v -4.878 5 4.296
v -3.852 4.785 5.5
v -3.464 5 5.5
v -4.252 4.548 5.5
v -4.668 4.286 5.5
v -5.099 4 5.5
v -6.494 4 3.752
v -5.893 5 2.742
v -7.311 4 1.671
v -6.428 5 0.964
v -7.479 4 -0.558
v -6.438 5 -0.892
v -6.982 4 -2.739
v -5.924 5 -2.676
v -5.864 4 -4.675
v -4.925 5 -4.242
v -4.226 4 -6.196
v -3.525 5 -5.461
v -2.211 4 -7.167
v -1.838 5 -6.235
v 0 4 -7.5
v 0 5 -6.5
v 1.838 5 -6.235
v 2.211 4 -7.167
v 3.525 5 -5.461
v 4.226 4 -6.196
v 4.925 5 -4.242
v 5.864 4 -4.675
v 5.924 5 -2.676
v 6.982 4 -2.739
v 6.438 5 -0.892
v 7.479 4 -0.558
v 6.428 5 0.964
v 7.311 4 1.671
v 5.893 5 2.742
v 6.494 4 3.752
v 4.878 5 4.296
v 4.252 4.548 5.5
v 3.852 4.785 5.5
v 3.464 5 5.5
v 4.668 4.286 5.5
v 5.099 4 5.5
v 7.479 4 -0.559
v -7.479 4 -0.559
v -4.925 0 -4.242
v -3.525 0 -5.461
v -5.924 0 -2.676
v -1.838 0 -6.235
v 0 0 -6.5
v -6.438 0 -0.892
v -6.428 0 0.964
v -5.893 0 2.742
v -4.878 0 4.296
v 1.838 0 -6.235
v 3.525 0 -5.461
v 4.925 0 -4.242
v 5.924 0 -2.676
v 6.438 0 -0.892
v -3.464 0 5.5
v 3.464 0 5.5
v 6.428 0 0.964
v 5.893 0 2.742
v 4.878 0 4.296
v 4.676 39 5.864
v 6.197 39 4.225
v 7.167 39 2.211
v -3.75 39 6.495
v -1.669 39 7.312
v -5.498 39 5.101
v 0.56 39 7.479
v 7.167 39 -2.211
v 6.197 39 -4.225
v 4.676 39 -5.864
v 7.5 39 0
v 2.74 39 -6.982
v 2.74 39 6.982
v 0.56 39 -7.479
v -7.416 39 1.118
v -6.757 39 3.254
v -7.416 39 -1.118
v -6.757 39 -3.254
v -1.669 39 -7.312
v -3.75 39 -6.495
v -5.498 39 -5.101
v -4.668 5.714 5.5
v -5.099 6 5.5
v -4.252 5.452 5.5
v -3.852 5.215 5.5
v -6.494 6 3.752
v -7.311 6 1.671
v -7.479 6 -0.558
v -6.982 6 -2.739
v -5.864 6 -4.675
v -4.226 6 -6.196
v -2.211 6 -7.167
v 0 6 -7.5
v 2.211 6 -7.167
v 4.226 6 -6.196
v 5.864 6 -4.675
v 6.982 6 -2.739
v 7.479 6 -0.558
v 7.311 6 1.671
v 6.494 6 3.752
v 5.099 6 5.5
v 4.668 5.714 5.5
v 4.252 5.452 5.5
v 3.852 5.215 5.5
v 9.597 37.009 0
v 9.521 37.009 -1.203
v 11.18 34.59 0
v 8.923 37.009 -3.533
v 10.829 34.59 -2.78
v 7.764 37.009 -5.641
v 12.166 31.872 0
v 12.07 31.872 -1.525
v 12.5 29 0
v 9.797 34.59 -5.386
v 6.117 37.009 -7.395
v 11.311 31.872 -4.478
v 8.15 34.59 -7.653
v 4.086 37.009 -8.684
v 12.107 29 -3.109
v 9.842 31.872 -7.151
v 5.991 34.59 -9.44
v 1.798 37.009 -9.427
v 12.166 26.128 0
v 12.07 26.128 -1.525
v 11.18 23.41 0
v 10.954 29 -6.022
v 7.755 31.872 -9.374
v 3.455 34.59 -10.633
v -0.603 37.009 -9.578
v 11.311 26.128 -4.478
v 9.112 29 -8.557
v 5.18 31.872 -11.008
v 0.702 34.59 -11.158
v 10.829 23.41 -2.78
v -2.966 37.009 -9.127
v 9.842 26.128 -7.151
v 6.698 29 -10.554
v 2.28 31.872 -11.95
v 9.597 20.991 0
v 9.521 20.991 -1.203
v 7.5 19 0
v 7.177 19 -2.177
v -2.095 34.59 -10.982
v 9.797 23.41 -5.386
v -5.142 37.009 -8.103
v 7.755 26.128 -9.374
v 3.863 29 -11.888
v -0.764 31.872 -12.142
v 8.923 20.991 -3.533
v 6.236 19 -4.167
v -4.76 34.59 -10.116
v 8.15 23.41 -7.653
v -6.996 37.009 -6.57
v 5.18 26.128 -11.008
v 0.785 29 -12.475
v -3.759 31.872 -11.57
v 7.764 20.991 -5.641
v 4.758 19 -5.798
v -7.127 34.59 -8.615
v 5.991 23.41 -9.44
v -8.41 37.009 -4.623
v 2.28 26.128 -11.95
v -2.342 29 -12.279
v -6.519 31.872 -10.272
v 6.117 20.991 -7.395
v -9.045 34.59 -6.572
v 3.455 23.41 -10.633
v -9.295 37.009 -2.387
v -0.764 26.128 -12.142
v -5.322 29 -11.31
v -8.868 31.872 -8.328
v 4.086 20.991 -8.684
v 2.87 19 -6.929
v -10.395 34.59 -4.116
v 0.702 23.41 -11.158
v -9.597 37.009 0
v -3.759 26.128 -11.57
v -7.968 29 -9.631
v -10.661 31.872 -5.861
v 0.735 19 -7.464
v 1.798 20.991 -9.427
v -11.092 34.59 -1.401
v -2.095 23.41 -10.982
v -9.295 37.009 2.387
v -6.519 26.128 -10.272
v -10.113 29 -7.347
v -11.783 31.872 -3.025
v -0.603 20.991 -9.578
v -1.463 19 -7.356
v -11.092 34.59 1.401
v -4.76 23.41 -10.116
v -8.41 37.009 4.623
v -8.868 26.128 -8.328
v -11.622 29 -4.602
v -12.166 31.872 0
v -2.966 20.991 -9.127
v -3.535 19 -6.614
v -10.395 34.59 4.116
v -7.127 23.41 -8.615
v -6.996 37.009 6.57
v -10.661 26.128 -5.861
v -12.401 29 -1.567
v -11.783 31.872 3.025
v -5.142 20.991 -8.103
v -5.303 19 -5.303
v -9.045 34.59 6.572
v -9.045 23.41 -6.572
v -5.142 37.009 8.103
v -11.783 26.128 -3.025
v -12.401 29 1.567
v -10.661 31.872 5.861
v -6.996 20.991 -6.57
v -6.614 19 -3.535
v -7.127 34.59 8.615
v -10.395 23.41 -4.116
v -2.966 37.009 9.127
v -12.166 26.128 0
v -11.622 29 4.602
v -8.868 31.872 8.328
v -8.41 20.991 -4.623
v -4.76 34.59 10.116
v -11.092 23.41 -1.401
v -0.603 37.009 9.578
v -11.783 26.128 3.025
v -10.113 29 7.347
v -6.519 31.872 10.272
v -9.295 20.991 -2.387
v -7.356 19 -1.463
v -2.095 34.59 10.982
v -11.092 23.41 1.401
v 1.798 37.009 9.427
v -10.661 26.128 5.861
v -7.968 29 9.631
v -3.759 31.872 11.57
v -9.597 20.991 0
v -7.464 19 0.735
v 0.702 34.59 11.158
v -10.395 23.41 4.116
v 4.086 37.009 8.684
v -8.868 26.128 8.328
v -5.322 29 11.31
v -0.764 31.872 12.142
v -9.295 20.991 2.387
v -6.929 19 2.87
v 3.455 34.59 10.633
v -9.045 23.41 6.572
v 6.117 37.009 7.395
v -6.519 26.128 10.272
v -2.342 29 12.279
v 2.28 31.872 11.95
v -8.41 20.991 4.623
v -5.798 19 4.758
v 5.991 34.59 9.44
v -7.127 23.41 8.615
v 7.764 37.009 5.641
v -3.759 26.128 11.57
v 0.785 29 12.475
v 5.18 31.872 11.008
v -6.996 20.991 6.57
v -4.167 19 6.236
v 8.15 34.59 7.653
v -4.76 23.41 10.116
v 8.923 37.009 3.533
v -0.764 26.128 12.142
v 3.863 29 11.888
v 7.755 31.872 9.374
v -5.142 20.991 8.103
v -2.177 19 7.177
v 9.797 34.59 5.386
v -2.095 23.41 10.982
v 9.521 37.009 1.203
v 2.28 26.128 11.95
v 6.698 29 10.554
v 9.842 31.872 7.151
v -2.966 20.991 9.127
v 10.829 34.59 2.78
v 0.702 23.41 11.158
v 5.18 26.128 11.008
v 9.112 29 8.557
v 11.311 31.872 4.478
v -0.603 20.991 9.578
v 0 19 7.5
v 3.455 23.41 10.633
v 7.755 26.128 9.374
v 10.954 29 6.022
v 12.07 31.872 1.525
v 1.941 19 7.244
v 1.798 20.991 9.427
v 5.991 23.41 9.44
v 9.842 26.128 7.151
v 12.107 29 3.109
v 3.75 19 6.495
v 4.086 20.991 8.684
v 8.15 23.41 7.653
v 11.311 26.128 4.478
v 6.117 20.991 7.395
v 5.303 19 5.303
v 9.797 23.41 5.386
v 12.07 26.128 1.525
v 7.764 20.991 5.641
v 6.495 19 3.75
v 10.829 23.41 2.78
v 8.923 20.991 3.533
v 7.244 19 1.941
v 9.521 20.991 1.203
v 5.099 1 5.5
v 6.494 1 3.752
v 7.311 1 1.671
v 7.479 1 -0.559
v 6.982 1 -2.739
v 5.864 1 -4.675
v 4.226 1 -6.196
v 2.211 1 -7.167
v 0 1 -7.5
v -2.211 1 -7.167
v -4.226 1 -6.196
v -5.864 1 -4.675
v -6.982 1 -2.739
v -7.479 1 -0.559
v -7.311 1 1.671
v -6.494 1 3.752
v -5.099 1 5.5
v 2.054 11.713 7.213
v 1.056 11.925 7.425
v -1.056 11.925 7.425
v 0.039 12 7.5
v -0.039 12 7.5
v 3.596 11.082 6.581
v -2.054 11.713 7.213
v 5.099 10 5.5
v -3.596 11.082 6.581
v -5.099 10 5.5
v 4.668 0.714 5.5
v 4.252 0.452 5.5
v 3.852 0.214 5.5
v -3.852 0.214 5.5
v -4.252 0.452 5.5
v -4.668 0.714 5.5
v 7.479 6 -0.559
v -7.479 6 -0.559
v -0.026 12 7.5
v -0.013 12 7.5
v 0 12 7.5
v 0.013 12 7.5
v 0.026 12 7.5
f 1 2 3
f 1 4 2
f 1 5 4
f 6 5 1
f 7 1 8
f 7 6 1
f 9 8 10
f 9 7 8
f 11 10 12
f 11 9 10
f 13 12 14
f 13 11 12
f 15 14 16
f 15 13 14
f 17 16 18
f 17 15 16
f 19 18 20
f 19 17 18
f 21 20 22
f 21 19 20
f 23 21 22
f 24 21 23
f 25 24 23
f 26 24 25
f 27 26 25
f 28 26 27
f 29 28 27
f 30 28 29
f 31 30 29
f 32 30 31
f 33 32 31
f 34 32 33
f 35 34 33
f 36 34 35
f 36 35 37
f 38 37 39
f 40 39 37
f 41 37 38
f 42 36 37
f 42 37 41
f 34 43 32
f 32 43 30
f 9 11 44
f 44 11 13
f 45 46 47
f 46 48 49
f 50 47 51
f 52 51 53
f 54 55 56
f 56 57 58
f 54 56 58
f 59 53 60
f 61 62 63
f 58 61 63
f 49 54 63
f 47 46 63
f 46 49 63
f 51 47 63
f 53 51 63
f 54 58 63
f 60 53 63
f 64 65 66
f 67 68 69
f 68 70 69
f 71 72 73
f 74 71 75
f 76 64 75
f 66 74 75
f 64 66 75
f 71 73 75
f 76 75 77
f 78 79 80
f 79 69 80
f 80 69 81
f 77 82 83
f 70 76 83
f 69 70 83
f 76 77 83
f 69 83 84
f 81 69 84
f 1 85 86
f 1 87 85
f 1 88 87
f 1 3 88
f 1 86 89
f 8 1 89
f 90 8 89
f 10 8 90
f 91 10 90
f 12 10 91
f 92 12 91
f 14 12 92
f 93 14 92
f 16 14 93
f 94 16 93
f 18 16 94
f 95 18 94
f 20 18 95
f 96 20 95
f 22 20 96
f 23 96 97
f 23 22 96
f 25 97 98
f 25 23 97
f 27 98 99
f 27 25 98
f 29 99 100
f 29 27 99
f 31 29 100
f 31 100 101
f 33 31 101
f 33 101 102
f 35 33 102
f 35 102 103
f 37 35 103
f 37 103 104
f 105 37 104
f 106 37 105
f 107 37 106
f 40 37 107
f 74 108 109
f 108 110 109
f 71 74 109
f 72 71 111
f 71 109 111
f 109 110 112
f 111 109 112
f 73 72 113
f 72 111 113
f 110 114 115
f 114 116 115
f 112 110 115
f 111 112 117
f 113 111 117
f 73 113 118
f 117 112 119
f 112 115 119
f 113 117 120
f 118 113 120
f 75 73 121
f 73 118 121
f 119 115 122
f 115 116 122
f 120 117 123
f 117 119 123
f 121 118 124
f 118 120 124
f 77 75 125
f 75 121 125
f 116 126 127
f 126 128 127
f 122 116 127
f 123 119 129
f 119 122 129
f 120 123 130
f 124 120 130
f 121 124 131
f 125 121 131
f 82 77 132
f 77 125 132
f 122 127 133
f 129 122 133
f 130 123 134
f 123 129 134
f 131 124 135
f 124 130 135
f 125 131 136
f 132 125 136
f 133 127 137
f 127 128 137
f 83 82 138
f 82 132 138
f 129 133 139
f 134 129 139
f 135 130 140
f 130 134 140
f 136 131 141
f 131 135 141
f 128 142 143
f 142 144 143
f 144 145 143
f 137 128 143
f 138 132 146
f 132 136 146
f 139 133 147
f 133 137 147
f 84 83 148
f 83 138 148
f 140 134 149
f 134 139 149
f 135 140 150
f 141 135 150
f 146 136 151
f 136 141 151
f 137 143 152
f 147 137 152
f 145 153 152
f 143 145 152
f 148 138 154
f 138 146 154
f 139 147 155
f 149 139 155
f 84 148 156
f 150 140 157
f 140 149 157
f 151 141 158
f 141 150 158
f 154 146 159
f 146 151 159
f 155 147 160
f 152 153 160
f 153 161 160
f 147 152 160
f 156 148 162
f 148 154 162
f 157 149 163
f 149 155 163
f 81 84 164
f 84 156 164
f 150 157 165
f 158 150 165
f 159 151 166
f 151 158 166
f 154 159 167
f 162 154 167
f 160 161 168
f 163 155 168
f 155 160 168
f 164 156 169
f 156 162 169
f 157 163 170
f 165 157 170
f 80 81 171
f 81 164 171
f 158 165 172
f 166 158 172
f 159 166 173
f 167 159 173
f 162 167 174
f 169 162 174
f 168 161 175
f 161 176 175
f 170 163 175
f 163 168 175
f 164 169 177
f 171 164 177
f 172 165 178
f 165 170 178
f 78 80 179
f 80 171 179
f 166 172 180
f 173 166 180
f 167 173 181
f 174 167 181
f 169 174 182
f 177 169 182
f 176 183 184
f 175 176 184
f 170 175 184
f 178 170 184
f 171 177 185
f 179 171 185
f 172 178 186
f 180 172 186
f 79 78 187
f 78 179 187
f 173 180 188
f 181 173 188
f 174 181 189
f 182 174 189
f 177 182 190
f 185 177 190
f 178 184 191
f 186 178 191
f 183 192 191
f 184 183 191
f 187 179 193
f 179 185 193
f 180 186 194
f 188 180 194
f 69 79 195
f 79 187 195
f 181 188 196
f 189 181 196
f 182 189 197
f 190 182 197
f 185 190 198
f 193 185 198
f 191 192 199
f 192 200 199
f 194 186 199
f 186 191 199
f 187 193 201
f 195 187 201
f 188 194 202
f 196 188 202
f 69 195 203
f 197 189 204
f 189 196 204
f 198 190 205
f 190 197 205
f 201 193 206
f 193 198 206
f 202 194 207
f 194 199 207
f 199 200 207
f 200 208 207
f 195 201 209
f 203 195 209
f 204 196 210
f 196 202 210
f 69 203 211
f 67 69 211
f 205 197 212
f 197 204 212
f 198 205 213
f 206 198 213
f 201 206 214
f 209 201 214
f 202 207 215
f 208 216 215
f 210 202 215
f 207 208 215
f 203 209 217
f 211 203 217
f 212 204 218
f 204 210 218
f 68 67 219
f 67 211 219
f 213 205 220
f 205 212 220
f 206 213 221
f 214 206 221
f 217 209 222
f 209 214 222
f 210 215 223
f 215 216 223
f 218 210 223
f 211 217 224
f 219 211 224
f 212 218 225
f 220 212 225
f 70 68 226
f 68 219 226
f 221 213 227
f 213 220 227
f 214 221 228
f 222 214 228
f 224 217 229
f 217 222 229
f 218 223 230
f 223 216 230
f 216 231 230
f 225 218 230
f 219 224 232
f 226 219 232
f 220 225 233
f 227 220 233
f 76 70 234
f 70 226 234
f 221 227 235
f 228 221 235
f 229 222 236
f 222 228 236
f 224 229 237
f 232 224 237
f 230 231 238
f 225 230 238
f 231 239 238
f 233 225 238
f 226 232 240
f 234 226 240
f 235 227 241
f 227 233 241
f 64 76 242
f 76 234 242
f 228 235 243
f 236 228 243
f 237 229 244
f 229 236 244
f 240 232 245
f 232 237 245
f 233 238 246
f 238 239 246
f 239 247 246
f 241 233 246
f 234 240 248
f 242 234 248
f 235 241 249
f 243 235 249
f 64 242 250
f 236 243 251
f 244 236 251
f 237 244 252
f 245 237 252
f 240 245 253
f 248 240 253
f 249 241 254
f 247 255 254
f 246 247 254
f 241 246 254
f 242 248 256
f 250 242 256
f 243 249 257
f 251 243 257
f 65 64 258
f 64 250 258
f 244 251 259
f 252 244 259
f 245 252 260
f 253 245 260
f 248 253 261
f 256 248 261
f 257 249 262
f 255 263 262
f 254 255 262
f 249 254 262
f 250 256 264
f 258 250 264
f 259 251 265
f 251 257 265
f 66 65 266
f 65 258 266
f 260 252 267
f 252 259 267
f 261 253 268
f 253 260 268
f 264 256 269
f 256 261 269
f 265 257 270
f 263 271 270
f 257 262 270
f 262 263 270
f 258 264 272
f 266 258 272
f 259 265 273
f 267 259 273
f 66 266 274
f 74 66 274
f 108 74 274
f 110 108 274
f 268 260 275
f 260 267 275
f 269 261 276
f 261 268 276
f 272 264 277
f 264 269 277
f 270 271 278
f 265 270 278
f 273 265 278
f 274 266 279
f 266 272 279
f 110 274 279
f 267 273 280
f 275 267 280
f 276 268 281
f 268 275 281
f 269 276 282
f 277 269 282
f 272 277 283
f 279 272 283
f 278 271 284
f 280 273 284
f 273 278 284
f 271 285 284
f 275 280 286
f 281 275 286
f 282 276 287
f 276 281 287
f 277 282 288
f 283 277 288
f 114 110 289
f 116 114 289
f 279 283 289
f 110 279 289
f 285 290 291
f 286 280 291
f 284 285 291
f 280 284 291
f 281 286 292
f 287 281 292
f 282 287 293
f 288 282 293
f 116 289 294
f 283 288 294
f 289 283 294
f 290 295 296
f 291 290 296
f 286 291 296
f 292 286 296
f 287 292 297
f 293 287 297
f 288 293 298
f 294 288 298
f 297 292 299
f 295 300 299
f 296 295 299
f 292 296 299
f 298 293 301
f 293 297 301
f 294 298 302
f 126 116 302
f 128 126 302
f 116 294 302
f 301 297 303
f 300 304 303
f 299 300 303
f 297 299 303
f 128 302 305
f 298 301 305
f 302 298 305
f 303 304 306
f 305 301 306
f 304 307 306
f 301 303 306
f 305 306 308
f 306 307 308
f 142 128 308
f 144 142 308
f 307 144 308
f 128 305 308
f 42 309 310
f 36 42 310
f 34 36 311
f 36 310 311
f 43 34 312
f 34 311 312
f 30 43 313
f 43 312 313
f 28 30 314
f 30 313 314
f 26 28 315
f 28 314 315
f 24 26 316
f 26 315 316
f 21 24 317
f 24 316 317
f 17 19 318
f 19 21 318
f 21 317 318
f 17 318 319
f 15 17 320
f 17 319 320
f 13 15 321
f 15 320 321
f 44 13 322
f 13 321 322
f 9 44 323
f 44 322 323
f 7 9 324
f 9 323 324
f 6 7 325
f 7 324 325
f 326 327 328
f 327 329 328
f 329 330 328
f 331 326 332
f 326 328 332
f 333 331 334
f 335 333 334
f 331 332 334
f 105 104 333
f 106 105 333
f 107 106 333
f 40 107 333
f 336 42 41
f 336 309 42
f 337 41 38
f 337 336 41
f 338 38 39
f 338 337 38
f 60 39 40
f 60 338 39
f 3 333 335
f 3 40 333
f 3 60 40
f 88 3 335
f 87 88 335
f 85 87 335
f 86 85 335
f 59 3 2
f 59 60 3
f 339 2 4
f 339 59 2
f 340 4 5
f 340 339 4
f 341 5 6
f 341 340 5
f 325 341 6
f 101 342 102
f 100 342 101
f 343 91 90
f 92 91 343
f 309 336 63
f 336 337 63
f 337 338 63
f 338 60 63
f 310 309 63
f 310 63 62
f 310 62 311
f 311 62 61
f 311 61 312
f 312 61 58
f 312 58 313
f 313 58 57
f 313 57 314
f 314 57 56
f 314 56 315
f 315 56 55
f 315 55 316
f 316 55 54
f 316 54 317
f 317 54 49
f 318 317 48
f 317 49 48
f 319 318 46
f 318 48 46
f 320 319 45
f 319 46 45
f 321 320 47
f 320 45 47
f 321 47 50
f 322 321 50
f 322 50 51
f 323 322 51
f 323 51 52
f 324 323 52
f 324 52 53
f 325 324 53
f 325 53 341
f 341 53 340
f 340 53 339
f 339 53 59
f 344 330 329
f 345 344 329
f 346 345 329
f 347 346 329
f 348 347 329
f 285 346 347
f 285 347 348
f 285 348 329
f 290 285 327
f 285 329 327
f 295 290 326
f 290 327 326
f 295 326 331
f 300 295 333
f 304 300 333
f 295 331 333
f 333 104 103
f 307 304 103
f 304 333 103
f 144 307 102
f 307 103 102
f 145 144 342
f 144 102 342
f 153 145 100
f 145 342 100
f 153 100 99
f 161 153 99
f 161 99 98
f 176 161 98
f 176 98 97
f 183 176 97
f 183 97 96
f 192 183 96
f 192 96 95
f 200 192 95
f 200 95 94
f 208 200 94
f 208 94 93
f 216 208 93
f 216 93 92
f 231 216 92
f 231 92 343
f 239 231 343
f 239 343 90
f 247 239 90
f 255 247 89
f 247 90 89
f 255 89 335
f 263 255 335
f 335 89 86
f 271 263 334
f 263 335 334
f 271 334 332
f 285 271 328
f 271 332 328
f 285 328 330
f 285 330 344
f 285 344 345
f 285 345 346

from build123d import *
from build123d.topology import SkipClean

# Parameters (mm, degrees)
SKETCH1_R           = 7.5
BOSS_EXTRUDE1_DEPTH = 20
CUT_EXTRUDE2_DEPTH  = 12
CUT_EXTRUDE4_DEPTH  = 1
CHAMFER1_SIZE       = 1
CHAMFER3_SIZE       = 2
CHAMFER4_SIZE       = 1


with BuildPart() as part:
    # Sketch1 → Boss-Extrude1 (new body)
    with BuildSketch(Plane(origin=(0, 0, 0), x_dir=(1, 0, 0), z_dir=(0, 1, 0))):
        with Locations(Location((0, 0, 0), (0, 0, 270))):
            Circle(SKETCH1_R)
    extrude(amount=BOSS_EXTRUDE1_DEPTH)

    # Sketch2 → Revolve1 (revolve)
    with BuildSketch(Plane.XY):
        with BuildLine():
            Line((7.5, 18.99999999999999), (7.5, 20))
            Line((7.5, 20), (0, 20))
            Line((0, 20), (3.1e-16, 39))
            Line((3.1e-16, 39), (7.500000000000009, 39))
            ThreePointArc((7.500000000000009, 39), (12.500000000000009, 28.999999999999993), (7.5, 18.99999999999999))
        make_face()
    revolve(axis=Axis((0, 20, 0), (2e-17, 1, 0)))

    # Sketch3 → Cut-Extrude2 (cut)
    with BuildSketch(Plane(origin=(0, 0, 0), x_dir=(-1, 0, 0), z_dir=(0, -1, 0))):
        with BuildLine():
            Line((-5.099019513592785, -5.5), (0, -5.5))
            Line((0, -5.5), (5.099019513592785, -5.5))
            ThreePointArc((5.099019513592785, -5.5), (-1.21e-15, -7.5), (-5.099019513592785, -5.5))
        make_face()
    extrude(amount=-CUT_EXTRUDE2_DEPTH, mode=Mode.SUBTRACT)

    # Sketch4 → Cut-Extrude4 (cut, symmetric)
    with SkipClean():  # the faces are left unmerged after this step: merging them gives an invalid solid
        with BuildSketch(Plane(origin=(0, 5, 0), x_dir=(1, 0, 0), z_dir=(0, 1, 0))):
            with BuildLine():
                Line((-1.381010726618471, -6.351598961912246), (-1.8059371040395404, -8.305937104039092))
                ThreePointArc((-1.8059371040395404, -8.305937104039092), (-8.451345022667464, 0.9081670043741211), (-2e-17, 8.5))
                ThreePointArc((-2e-17, 8.5), (8.451345022667484, 0.9081670043739513), (1.8059371040392067, -8.305937104039163))
                Line((1.8059371040392067, -8.305937104039163), (1.3810107266181975, -6.351598961912305))
                ThreePointArc((1.3810107266181975, -6.351598961912305), (6.462793252628076, 0.6944806504035996), (1.2e-16, 6.5))
                ThreePointArc((1.2e-16, 6.5), (-6.462793252628061, 0.6944806504037396), (-1.381010726618471, -6.351598961912246))
            make_face()
        extrude(amount=CUT_EXTRUDE4_DEPTH, both=True, mode=Mode.SUBTRACT)

    # Chamfer1
    chamfer1_edges = [part.edges().sort_by_distance(p)[0] for p in [
        (-6.2449979983983965, 6, -1.8027756377319957),
        (6.244997998398398, 4, -1.8027756377319937),
    ]]
    chamfer(chamfer1_edges, length=CHAMFER1_SIZE - 0.0001)  # a hair under: the kernel refuses the full size

    # Chamfer3
    chamfer3_edges = [part.edges().sort_by_distance(p)[0] for p in [
        (0, 12, 5.5),
    ]]
    chamfer(chamfer3_edges, length=CHAMFER3_SIZE - 0.0001)  # a hair under: the kernel refuses the full size

    # Chamfer4
    chamfer4_edges = [part.edges().sort_by_distance(p)[0] for p in [
        (2.3e-15, 0, -7.5),
    ]]
    chamfer(chamfer4_edges, length=CHAMFER4_SIZE)


solid = part.part
